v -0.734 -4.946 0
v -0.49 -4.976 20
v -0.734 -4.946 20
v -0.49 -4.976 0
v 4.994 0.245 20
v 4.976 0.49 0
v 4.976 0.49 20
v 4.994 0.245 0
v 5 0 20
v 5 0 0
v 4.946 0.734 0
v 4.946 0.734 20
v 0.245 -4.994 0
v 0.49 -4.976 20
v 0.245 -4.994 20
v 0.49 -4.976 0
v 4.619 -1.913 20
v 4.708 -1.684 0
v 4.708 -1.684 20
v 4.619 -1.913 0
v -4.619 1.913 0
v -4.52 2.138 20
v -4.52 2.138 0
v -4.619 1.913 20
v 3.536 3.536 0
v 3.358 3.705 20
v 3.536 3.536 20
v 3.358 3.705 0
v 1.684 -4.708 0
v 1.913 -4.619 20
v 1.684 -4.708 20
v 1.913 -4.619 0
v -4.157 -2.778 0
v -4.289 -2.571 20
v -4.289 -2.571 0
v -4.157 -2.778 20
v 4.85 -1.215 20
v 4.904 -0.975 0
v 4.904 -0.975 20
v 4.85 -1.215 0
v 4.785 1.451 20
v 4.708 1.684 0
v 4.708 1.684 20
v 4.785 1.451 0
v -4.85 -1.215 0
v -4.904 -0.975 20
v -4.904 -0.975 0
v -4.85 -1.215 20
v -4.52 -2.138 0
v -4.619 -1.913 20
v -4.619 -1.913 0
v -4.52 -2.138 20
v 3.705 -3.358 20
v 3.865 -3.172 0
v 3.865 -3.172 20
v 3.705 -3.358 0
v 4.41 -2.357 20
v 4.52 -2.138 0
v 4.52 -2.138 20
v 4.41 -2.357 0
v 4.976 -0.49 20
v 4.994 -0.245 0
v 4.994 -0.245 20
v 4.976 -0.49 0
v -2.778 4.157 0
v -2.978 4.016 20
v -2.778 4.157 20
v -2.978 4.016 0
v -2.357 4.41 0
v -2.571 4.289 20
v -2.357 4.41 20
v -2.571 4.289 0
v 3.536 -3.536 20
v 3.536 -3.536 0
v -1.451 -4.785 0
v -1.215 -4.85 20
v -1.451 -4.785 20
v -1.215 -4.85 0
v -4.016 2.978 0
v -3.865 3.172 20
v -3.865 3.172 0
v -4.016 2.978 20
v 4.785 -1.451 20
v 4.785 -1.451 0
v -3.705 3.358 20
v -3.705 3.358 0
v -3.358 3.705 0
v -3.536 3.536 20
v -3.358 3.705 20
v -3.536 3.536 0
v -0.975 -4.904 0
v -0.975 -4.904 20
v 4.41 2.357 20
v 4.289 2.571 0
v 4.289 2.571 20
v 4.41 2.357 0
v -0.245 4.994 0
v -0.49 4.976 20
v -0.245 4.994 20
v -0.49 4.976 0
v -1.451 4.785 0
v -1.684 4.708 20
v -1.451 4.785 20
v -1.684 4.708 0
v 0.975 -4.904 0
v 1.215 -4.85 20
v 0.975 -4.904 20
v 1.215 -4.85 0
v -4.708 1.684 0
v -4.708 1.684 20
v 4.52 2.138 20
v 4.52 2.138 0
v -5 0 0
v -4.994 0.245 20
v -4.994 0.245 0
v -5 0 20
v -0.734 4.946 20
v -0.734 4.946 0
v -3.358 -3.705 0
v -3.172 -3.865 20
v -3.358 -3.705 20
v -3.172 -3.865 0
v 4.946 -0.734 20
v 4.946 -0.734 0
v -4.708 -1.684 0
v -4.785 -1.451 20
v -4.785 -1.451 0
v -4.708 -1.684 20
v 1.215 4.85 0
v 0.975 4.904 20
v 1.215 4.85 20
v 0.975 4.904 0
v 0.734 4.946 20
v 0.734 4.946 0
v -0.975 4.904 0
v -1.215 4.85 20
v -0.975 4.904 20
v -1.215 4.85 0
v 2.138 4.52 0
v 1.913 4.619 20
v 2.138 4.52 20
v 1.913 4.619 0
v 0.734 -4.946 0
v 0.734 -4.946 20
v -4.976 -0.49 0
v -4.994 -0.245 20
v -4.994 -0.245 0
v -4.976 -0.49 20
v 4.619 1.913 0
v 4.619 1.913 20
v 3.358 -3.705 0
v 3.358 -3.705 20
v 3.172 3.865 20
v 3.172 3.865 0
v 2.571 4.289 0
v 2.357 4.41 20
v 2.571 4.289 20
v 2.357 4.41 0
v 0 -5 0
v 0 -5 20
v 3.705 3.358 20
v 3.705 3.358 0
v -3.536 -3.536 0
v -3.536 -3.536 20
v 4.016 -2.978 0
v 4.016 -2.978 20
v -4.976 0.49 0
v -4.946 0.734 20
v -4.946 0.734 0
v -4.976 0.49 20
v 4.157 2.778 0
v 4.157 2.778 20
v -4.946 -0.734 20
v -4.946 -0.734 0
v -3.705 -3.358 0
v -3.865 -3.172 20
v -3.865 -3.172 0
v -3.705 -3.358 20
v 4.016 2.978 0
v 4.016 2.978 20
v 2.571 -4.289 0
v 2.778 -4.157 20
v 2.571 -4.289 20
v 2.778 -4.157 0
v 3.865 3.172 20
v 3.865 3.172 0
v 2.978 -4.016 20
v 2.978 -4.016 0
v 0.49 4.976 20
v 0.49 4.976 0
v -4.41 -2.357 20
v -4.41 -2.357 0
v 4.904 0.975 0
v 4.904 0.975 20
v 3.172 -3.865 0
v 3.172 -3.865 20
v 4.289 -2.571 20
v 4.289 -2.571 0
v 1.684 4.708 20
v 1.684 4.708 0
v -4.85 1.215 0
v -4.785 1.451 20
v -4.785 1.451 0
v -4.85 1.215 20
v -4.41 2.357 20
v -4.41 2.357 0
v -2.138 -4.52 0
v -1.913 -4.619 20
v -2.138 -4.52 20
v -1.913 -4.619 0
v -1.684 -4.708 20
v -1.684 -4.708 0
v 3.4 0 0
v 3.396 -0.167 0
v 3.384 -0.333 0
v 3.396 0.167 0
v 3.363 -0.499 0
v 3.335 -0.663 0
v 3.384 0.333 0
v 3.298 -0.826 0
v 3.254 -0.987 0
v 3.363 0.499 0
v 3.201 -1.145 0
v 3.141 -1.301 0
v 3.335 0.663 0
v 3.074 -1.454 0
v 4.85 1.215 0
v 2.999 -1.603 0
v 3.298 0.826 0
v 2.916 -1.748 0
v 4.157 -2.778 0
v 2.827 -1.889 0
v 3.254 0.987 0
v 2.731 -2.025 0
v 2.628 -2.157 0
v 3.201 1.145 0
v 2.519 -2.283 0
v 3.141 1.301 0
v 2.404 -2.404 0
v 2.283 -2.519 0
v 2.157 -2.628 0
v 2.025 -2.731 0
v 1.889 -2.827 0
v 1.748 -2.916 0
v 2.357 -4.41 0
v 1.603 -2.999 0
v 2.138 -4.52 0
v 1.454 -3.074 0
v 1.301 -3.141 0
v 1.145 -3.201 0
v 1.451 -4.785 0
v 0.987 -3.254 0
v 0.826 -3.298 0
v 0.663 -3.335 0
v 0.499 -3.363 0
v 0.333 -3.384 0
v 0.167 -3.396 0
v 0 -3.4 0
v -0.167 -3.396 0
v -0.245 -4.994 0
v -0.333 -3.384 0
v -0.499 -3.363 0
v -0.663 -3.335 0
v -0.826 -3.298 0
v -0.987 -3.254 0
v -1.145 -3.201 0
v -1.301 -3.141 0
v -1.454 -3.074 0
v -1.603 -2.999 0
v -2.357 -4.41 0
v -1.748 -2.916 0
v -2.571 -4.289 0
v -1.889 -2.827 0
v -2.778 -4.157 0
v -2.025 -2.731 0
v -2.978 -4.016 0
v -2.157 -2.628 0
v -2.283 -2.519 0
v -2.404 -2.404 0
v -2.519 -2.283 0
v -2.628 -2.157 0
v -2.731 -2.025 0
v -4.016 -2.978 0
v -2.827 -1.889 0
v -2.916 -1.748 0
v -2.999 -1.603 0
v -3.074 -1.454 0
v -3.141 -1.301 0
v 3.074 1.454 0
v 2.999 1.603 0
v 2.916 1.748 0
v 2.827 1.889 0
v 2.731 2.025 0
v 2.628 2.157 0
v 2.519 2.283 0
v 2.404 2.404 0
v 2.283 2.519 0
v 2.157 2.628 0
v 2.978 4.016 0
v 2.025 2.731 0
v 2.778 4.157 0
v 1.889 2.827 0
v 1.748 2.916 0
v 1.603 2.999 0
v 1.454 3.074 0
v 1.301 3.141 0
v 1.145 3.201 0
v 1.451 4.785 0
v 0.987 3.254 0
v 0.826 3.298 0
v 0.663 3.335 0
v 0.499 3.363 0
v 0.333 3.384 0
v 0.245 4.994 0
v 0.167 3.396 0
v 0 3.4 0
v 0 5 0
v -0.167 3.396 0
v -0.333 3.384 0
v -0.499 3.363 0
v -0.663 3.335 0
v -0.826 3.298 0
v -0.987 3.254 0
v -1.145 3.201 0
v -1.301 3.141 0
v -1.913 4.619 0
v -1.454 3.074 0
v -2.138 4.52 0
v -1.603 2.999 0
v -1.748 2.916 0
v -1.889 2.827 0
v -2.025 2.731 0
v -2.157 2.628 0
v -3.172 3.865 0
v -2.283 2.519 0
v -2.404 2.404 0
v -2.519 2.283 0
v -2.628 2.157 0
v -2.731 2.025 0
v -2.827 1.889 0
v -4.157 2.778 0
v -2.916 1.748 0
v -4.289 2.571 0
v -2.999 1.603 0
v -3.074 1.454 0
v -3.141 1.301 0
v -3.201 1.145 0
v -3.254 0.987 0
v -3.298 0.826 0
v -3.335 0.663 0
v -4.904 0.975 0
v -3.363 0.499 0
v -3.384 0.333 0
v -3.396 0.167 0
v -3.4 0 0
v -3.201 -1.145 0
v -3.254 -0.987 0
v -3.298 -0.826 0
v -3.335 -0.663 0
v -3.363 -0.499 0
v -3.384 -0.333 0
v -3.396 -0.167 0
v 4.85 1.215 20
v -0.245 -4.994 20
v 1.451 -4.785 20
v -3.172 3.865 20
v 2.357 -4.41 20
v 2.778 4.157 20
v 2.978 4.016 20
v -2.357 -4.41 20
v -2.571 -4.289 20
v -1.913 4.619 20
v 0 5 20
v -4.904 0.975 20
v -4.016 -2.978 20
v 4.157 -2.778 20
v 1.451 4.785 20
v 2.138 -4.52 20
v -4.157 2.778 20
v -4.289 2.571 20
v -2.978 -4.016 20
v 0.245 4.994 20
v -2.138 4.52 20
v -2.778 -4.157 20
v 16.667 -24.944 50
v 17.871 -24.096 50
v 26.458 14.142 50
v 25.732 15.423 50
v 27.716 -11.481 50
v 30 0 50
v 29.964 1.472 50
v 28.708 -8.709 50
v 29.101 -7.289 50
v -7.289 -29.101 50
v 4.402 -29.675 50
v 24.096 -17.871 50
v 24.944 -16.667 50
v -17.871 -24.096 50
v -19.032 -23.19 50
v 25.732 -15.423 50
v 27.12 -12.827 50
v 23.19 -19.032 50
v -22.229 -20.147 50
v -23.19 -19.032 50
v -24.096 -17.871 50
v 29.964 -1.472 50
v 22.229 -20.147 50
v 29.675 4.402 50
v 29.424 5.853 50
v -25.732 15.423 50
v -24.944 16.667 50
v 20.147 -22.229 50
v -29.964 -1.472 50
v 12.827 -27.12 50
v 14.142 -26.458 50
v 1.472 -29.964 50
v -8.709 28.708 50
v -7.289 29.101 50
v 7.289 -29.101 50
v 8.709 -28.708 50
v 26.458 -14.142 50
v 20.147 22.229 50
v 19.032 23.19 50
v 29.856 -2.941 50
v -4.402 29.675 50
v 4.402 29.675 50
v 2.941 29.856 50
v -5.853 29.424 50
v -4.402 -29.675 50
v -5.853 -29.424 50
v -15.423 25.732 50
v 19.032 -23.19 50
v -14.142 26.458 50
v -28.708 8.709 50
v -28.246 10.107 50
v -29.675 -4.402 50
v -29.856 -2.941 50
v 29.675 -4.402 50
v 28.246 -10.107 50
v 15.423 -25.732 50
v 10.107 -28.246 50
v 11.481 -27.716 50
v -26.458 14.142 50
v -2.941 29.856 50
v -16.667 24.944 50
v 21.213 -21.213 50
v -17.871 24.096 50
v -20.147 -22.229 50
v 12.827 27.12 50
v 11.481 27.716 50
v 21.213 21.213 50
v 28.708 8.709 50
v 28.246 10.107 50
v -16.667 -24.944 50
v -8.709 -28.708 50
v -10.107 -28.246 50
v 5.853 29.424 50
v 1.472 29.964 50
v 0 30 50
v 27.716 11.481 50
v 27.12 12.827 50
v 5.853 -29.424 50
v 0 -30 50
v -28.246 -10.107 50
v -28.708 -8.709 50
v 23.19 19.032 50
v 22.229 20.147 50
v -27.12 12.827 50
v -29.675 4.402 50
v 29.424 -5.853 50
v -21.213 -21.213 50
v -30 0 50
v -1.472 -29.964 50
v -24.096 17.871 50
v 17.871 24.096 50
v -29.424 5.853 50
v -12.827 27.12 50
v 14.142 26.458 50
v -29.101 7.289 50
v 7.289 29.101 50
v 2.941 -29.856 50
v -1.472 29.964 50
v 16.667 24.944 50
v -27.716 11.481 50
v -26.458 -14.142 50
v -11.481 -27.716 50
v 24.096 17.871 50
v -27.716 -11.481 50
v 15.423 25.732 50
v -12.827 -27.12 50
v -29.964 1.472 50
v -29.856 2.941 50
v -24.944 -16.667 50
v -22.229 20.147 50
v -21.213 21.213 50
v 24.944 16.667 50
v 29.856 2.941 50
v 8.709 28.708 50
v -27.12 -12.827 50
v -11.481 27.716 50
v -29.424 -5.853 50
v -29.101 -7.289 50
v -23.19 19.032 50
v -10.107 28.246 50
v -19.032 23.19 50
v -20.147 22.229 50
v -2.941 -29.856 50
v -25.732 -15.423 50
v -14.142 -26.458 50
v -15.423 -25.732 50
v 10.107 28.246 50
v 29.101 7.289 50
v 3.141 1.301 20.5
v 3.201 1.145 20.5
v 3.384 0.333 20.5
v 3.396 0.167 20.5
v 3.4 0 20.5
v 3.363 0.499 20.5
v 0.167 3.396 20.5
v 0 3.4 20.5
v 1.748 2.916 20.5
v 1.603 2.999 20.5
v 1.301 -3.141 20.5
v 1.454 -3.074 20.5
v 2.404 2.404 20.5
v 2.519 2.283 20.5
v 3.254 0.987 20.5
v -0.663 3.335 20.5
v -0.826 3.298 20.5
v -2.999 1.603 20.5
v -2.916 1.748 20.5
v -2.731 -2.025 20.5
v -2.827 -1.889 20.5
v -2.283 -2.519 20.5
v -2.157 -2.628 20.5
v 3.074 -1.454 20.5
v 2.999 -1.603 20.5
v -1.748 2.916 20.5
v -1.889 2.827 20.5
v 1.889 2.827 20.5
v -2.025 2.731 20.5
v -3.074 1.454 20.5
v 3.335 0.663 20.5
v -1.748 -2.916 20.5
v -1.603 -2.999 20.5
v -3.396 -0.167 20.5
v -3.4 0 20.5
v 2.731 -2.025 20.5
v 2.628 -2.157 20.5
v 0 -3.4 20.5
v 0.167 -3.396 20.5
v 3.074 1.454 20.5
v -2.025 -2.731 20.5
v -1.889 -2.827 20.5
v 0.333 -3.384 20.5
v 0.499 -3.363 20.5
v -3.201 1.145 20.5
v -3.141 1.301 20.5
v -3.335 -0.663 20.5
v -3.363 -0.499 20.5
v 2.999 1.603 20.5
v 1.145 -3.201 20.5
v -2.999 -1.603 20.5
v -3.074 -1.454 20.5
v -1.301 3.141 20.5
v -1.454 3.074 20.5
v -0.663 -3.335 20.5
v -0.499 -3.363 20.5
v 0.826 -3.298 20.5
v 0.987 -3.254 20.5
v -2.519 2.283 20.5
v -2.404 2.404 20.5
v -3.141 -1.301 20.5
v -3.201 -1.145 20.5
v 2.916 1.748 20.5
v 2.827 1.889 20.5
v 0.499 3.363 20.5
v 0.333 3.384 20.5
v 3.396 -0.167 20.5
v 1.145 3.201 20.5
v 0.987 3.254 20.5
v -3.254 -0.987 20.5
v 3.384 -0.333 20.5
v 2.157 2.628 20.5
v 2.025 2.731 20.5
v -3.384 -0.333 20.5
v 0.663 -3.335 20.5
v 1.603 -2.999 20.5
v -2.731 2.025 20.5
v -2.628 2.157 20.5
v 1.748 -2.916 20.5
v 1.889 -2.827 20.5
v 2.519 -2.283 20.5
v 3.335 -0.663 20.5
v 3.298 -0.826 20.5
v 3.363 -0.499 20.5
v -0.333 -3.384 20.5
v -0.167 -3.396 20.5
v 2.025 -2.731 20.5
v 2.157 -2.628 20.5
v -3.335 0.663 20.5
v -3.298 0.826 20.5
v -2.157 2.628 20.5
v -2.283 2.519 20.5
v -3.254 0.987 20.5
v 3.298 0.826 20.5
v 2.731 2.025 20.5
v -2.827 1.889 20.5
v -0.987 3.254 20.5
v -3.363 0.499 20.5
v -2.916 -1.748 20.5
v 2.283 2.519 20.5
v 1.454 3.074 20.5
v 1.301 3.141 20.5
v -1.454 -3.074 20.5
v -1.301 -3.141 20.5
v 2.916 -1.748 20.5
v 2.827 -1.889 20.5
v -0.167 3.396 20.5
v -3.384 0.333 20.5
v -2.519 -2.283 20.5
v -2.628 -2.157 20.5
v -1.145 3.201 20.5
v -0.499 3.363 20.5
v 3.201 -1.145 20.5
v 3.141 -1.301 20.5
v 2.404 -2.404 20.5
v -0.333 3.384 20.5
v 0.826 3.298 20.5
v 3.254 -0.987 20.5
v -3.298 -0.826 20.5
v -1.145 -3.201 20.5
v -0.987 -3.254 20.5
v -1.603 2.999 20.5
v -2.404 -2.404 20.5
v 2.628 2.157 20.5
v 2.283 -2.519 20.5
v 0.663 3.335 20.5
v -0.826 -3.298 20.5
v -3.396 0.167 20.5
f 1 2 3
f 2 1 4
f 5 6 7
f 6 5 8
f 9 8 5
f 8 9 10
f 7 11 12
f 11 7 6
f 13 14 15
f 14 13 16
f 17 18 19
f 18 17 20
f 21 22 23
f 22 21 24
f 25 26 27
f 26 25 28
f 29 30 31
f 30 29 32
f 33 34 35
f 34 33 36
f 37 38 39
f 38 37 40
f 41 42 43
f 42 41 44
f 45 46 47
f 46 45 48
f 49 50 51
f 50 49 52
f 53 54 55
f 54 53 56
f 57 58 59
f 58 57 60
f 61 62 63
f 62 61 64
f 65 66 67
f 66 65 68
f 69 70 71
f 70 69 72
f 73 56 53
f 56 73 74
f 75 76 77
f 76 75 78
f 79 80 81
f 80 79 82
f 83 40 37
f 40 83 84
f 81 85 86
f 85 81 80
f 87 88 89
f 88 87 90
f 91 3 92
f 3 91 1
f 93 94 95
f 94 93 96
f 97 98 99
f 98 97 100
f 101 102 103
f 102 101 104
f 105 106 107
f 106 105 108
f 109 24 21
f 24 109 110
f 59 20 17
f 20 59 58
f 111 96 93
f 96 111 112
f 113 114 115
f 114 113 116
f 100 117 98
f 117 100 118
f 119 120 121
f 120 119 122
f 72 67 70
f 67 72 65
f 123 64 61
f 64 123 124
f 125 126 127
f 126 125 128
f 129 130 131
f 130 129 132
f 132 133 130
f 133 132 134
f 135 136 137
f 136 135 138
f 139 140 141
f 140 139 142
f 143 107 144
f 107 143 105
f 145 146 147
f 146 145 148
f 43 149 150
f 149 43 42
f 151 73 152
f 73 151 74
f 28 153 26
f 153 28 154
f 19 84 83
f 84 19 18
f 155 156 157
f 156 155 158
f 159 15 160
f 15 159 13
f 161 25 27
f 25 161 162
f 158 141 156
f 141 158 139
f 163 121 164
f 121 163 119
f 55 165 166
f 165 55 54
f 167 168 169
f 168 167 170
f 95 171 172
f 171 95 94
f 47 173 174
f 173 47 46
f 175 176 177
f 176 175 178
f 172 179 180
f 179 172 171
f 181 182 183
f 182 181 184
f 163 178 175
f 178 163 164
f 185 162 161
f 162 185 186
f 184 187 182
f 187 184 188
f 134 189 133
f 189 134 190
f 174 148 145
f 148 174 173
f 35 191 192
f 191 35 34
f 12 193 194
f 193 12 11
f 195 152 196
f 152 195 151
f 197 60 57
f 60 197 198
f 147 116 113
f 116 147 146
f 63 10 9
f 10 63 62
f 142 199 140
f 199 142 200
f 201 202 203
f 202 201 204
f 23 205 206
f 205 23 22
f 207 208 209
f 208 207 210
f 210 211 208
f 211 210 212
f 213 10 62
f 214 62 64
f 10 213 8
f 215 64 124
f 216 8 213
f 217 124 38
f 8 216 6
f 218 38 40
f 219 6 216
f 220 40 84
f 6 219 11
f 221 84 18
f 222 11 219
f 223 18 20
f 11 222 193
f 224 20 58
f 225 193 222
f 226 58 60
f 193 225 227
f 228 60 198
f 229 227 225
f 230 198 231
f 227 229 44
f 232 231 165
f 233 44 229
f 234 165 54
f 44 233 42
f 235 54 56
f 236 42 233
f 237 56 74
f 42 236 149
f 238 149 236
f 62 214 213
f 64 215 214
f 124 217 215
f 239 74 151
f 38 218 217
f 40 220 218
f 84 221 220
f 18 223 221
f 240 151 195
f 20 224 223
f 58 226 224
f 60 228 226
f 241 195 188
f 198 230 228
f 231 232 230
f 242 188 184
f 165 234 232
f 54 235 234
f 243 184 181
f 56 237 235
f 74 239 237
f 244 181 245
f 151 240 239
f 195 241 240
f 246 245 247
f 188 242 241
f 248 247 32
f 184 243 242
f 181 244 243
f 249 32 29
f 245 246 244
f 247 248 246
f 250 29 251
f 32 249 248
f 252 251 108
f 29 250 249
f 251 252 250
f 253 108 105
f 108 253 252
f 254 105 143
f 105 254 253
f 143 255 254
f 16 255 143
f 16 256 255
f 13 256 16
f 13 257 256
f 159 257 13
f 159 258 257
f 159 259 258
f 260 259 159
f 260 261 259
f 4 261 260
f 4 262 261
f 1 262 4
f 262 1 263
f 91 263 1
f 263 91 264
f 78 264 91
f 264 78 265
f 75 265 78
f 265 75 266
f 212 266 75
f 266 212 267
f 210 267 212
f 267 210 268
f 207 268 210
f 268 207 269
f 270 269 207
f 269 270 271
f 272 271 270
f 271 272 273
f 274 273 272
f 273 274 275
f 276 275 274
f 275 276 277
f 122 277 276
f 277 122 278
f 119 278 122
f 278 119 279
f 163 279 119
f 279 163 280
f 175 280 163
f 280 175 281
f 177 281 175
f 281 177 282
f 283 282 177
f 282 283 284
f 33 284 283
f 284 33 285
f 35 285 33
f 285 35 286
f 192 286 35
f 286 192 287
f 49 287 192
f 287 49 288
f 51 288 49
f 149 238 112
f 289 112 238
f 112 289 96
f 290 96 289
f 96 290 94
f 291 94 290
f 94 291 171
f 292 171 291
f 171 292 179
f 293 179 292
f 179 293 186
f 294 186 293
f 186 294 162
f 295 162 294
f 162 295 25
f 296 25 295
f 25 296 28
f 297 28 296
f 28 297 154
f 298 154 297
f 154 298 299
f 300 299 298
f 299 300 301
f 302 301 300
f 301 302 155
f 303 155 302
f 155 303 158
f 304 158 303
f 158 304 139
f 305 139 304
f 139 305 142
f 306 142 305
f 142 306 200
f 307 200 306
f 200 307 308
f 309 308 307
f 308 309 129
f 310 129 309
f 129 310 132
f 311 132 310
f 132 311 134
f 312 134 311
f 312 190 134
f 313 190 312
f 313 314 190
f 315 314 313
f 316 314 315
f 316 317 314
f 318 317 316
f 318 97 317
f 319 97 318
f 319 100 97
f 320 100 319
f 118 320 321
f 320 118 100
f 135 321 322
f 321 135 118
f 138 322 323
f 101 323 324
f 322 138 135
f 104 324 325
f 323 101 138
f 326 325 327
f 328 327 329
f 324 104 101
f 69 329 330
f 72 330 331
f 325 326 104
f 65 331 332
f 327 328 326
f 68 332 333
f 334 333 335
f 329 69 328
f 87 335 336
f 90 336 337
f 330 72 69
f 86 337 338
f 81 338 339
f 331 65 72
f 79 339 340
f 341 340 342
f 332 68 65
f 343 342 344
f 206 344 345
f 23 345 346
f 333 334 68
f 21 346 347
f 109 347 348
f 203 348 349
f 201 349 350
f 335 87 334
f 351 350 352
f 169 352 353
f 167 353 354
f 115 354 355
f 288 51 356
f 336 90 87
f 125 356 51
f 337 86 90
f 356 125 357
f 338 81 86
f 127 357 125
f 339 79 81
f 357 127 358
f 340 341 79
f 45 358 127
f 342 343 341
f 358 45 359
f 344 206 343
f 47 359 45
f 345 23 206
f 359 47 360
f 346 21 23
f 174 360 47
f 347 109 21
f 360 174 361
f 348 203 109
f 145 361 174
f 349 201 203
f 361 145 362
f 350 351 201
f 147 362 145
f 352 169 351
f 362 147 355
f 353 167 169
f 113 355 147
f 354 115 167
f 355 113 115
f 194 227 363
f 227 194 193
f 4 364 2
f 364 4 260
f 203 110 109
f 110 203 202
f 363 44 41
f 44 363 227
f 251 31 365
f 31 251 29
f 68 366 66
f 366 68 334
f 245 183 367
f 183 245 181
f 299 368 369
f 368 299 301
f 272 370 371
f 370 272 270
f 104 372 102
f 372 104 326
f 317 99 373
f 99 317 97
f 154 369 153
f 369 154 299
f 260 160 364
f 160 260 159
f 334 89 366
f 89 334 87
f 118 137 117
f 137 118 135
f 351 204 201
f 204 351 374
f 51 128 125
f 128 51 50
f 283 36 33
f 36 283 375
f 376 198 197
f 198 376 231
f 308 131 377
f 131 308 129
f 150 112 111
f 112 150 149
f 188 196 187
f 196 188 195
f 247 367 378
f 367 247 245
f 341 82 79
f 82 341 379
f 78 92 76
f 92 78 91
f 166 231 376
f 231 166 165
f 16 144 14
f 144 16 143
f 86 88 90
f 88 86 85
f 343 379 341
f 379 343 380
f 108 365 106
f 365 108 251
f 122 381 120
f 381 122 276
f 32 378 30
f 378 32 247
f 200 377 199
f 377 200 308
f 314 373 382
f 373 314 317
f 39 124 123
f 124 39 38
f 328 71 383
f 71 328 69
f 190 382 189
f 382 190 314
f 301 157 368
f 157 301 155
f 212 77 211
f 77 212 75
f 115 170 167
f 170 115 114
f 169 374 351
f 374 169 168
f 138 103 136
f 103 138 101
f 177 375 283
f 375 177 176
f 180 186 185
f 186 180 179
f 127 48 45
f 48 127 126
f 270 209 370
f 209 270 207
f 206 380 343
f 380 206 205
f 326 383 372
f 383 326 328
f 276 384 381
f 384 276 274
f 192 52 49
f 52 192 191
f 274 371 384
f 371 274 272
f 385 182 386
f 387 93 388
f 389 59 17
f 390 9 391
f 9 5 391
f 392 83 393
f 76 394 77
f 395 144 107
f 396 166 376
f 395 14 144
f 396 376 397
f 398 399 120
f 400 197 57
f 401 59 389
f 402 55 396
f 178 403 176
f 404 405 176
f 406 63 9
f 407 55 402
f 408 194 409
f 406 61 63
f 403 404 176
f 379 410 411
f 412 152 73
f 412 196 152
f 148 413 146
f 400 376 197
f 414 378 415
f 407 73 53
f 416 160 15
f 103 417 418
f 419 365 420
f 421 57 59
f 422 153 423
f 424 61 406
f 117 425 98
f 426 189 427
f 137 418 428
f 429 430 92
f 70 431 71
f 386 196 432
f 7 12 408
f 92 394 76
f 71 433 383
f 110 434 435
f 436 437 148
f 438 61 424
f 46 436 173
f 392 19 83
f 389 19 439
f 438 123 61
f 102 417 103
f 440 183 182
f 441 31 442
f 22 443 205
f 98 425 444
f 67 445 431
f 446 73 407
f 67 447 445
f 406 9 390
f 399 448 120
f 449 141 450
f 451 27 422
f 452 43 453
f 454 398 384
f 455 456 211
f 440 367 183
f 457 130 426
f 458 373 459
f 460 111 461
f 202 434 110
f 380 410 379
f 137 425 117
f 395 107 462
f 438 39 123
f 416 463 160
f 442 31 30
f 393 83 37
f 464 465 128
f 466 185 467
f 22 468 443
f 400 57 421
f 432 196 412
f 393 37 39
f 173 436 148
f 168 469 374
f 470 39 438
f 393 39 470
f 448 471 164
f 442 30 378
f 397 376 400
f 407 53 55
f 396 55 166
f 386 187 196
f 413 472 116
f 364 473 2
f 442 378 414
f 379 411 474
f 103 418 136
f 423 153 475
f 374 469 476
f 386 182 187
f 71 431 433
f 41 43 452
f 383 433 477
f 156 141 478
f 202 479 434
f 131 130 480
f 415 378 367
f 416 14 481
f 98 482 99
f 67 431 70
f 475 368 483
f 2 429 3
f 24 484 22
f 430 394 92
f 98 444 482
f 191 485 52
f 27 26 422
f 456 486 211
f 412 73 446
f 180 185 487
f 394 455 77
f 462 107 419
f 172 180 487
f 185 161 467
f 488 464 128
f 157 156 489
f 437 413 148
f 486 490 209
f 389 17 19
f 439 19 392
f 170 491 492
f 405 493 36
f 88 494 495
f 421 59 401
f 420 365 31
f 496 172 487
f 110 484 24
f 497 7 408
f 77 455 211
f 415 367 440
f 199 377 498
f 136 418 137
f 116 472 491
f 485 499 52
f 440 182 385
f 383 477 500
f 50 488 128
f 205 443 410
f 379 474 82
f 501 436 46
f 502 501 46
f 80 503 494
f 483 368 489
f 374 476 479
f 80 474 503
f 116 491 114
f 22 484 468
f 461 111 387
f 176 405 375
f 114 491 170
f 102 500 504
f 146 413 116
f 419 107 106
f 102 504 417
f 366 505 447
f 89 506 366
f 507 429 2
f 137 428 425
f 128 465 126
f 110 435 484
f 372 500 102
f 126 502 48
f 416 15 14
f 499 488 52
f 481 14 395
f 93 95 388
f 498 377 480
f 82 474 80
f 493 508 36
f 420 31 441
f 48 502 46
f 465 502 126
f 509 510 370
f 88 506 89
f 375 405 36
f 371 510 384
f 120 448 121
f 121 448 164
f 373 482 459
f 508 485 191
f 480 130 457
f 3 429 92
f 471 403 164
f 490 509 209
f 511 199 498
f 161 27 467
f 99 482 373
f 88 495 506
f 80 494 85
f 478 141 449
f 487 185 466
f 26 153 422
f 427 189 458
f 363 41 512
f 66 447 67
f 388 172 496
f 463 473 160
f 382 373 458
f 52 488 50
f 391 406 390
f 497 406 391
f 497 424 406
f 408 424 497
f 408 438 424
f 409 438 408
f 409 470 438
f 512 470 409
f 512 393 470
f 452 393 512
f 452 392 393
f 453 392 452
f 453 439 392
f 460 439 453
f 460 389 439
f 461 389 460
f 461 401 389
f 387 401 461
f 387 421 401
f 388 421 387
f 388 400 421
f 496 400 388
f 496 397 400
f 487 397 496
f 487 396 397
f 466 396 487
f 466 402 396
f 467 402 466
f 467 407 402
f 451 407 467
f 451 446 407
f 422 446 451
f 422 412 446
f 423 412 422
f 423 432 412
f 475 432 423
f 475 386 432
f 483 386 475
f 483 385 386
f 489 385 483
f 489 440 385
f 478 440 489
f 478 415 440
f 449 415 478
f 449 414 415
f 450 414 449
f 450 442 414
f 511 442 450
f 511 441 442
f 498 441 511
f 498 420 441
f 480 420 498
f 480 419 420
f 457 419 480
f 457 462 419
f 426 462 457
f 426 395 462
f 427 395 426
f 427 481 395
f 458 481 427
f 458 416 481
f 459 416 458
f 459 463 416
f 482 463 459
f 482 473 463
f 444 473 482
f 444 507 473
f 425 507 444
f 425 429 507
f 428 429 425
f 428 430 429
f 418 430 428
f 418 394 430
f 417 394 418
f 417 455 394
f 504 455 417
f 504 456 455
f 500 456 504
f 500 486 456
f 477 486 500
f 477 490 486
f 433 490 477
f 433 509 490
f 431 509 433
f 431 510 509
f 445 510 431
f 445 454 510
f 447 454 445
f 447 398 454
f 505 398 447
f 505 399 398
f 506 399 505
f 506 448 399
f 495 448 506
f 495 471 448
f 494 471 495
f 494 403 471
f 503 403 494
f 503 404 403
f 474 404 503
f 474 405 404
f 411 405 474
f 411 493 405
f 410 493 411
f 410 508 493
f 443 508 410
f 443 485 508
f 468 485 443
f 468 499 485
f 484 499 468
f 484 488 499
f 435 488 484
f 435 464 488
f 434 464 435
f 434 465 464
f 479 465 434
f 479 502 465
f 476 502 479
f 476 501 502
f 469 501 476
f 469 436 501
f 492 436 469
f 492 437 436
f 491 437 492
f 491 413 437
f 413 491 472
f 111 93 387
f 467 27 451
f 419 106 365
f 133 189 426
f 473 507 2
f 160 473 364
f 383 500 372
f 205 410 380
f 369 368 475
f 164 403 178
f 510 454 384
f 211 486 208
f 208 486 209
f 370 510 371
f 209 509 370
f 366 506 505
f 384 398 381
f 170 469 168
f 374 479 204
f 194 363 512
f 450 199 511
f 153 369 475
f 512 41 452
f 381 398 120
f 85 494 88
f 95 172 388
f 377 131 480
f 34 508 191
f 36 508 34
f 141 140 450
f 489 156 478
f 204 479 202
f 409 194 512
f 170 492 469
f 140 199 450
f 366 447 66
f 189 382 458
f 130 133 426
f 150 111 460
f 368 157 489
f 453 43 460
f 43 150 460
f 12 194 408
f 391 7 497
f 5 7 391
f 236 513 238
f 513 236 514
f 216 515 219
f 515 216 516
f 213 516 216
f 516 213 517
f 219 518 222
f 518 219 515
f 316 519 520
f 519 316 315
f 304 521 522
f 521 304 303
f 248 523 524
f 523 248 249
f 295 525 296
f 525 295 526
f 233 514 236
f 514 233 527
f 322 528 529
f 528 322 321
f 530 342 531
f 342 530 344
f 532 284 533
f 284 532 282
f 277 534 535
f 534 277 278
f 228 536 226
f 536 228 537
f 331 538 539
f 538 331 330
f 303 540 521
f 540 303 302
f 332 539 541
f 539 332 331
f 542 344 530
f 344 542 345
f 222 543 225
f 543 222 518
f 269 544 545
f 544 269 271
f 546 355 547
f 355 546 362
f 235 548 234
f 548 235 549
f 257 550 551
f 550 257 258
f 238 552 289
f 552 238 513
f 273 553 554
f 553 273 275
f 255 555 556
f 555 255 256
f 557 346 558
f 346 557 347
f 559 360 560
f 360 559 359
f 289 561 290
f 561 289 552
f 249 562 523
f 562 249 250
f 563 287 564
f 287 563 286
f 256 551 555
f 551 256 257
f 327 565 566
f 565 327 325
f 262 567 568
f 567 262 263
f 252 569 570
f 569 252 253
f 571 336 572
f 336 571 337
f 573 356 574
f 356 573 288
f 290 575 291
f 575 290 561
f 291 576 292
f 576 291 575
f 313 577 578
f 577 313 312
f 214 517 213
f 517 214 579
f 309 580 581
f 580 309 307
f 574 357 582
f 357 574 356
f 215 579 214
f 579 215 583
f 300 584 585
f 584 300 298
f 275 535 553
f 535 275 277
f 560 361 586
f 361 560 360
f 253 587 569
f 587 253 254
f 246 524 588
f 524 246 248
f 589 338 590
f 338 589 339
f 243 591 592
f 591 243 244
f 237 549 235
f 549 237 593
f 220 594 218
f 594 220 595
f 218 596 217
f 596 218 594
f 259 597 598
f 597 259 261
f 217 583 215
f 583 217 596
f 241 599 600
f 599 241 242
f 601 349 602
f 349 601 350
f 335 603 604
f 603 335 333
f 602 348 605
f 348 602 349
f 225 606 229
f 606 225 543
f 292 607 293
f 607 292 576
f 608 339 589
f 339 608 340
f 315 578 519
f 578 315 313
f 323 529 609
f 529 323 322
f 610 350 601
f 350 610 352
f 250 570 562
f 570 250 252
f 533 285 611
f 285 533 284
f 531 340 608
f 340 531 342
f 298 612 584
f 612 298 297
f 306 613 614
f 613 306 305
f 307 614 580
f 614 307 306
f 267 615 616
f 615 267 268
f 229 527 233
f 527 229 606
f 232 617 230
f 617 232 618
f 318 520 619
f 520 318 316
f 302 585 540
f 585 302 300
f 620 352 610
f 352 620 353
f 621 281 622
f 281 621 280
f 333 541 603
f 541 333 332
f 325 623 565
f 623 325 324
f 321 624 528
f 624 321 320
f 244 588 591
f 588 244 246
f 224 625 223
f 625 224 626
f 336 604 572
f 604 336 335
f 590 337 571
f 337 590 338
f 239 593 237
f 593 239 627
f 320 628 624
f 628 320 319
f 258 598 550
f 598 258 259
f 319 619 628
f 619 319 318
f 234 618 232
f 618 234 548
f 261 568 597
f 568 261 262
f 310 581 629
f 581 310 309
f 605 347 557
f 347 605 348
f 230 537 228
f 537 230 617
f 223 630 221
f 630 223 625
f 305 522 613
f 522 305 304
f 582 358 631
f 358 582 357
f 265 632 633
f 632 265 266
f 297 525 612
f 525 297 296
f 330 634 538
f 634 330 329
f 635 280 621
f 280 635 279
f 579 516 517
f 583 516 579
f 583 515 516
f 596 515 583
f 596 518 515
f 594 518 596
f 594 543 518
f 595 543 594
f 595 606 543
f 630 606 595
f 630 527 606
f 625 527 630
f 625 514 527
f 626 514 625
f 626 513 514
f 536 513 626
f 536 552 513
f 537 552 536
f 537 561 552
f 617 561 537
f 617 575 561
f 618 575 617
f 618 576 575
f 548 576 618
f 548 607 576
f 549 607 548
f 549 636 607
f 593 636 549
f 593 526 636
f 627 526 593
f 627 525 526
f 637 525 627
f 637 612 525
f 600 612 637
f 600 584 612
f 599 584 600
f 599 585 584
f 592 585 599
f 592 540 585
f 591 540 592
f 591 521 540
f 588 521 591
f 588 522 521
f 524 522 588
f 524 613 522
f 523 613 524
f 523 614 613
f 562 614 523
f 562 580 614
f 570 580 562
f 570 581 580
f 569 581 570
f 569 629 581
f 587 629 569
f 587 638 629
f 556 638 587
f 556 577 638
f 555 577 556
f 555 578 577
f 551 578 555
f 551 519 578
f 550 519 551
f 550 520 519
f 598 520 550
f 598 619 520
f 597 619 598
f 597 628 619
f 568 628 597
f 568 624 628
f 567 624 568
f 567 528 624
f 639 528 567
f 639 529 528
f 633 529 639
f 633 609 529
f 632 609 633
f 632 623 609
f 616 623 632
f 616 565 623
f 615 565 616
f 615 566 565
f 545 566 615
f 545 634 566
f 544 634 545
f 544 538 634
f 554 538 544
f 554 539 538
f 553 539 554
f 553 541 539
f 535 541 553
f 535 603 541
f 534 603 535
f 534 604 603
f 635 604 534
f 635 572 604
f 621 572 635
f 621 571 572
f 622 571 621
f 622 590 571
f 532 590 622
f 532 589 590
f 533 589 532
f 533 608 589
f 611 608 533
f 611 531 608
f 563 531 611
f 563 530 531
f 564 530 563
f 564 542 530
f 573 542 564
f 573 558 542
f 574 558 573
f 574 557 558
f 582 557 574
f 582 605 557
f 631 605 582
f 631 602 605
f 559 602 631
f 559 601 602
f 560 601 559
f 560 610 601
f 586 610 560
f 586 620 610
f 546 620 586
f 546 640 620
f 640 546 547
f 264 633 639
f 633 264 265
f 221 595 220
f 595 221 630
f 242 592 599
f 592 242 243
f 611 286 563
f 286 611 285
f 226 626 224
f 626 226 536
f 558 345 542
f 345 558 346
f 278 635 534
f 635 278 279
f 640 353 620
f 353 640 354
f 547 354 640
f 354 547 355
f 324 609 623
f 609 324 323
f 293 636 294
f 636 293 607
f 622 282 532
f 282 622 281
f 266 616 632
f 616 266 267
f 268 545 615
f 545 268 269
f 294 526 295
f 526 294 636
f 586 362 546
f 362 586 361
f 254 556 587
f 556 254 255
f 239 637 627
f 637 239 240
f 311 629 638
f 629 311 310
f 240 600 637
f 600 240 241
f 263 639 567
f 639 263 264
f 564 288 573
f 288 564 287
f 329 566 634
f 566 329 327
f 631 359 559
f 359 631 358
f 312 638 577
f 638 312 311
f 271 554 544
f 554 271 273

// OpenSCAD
// Small lab funnel, printed upright: spout at the bottom, wide rim at the top
// All dimensions in millimetres

// ---- Parameters ----
spout_od      = 10;    // outer diameter of straight spout
spout_length  = 20;    // spout runs from z = 0 to z = 20
cone_bottom_d = 10;    // cone outer diameter at z = 20 (matches spout)
cone_top_d    = 60;    // cone outer diameter at rim (z = 50)
rim_z         = 50;    // height of funnel rim
wall          = 1.6;   // wall thickness everywhere

eps            = 0.5;   // overshoot for clean boolean cuts
$fn            = 128;   // curve resolution

// ---- Derived ----
spout_id = spout_od - 2 * wall;   // 6.8 mm bore
cone_h   = rim_z - spout_length;  // 30 mm cone height

// ---- Model ----
difference() {
    union() {
        // Straight spout tube
        cylinder(d = spout_od, h = spout_length);

        // Cone: from spout top up to the rim
        translate([0, 0, spout_length])
            cylinder(d1 = cone_bottom_d, d2 = cone_top_d, h = cone_h);
    }

    // Bottom exit: bore through the spout end at z = 0
    translate([0, 0, -eps])
        cylinder(d = spout_id, h = spout_length + 2 * eps);
}
